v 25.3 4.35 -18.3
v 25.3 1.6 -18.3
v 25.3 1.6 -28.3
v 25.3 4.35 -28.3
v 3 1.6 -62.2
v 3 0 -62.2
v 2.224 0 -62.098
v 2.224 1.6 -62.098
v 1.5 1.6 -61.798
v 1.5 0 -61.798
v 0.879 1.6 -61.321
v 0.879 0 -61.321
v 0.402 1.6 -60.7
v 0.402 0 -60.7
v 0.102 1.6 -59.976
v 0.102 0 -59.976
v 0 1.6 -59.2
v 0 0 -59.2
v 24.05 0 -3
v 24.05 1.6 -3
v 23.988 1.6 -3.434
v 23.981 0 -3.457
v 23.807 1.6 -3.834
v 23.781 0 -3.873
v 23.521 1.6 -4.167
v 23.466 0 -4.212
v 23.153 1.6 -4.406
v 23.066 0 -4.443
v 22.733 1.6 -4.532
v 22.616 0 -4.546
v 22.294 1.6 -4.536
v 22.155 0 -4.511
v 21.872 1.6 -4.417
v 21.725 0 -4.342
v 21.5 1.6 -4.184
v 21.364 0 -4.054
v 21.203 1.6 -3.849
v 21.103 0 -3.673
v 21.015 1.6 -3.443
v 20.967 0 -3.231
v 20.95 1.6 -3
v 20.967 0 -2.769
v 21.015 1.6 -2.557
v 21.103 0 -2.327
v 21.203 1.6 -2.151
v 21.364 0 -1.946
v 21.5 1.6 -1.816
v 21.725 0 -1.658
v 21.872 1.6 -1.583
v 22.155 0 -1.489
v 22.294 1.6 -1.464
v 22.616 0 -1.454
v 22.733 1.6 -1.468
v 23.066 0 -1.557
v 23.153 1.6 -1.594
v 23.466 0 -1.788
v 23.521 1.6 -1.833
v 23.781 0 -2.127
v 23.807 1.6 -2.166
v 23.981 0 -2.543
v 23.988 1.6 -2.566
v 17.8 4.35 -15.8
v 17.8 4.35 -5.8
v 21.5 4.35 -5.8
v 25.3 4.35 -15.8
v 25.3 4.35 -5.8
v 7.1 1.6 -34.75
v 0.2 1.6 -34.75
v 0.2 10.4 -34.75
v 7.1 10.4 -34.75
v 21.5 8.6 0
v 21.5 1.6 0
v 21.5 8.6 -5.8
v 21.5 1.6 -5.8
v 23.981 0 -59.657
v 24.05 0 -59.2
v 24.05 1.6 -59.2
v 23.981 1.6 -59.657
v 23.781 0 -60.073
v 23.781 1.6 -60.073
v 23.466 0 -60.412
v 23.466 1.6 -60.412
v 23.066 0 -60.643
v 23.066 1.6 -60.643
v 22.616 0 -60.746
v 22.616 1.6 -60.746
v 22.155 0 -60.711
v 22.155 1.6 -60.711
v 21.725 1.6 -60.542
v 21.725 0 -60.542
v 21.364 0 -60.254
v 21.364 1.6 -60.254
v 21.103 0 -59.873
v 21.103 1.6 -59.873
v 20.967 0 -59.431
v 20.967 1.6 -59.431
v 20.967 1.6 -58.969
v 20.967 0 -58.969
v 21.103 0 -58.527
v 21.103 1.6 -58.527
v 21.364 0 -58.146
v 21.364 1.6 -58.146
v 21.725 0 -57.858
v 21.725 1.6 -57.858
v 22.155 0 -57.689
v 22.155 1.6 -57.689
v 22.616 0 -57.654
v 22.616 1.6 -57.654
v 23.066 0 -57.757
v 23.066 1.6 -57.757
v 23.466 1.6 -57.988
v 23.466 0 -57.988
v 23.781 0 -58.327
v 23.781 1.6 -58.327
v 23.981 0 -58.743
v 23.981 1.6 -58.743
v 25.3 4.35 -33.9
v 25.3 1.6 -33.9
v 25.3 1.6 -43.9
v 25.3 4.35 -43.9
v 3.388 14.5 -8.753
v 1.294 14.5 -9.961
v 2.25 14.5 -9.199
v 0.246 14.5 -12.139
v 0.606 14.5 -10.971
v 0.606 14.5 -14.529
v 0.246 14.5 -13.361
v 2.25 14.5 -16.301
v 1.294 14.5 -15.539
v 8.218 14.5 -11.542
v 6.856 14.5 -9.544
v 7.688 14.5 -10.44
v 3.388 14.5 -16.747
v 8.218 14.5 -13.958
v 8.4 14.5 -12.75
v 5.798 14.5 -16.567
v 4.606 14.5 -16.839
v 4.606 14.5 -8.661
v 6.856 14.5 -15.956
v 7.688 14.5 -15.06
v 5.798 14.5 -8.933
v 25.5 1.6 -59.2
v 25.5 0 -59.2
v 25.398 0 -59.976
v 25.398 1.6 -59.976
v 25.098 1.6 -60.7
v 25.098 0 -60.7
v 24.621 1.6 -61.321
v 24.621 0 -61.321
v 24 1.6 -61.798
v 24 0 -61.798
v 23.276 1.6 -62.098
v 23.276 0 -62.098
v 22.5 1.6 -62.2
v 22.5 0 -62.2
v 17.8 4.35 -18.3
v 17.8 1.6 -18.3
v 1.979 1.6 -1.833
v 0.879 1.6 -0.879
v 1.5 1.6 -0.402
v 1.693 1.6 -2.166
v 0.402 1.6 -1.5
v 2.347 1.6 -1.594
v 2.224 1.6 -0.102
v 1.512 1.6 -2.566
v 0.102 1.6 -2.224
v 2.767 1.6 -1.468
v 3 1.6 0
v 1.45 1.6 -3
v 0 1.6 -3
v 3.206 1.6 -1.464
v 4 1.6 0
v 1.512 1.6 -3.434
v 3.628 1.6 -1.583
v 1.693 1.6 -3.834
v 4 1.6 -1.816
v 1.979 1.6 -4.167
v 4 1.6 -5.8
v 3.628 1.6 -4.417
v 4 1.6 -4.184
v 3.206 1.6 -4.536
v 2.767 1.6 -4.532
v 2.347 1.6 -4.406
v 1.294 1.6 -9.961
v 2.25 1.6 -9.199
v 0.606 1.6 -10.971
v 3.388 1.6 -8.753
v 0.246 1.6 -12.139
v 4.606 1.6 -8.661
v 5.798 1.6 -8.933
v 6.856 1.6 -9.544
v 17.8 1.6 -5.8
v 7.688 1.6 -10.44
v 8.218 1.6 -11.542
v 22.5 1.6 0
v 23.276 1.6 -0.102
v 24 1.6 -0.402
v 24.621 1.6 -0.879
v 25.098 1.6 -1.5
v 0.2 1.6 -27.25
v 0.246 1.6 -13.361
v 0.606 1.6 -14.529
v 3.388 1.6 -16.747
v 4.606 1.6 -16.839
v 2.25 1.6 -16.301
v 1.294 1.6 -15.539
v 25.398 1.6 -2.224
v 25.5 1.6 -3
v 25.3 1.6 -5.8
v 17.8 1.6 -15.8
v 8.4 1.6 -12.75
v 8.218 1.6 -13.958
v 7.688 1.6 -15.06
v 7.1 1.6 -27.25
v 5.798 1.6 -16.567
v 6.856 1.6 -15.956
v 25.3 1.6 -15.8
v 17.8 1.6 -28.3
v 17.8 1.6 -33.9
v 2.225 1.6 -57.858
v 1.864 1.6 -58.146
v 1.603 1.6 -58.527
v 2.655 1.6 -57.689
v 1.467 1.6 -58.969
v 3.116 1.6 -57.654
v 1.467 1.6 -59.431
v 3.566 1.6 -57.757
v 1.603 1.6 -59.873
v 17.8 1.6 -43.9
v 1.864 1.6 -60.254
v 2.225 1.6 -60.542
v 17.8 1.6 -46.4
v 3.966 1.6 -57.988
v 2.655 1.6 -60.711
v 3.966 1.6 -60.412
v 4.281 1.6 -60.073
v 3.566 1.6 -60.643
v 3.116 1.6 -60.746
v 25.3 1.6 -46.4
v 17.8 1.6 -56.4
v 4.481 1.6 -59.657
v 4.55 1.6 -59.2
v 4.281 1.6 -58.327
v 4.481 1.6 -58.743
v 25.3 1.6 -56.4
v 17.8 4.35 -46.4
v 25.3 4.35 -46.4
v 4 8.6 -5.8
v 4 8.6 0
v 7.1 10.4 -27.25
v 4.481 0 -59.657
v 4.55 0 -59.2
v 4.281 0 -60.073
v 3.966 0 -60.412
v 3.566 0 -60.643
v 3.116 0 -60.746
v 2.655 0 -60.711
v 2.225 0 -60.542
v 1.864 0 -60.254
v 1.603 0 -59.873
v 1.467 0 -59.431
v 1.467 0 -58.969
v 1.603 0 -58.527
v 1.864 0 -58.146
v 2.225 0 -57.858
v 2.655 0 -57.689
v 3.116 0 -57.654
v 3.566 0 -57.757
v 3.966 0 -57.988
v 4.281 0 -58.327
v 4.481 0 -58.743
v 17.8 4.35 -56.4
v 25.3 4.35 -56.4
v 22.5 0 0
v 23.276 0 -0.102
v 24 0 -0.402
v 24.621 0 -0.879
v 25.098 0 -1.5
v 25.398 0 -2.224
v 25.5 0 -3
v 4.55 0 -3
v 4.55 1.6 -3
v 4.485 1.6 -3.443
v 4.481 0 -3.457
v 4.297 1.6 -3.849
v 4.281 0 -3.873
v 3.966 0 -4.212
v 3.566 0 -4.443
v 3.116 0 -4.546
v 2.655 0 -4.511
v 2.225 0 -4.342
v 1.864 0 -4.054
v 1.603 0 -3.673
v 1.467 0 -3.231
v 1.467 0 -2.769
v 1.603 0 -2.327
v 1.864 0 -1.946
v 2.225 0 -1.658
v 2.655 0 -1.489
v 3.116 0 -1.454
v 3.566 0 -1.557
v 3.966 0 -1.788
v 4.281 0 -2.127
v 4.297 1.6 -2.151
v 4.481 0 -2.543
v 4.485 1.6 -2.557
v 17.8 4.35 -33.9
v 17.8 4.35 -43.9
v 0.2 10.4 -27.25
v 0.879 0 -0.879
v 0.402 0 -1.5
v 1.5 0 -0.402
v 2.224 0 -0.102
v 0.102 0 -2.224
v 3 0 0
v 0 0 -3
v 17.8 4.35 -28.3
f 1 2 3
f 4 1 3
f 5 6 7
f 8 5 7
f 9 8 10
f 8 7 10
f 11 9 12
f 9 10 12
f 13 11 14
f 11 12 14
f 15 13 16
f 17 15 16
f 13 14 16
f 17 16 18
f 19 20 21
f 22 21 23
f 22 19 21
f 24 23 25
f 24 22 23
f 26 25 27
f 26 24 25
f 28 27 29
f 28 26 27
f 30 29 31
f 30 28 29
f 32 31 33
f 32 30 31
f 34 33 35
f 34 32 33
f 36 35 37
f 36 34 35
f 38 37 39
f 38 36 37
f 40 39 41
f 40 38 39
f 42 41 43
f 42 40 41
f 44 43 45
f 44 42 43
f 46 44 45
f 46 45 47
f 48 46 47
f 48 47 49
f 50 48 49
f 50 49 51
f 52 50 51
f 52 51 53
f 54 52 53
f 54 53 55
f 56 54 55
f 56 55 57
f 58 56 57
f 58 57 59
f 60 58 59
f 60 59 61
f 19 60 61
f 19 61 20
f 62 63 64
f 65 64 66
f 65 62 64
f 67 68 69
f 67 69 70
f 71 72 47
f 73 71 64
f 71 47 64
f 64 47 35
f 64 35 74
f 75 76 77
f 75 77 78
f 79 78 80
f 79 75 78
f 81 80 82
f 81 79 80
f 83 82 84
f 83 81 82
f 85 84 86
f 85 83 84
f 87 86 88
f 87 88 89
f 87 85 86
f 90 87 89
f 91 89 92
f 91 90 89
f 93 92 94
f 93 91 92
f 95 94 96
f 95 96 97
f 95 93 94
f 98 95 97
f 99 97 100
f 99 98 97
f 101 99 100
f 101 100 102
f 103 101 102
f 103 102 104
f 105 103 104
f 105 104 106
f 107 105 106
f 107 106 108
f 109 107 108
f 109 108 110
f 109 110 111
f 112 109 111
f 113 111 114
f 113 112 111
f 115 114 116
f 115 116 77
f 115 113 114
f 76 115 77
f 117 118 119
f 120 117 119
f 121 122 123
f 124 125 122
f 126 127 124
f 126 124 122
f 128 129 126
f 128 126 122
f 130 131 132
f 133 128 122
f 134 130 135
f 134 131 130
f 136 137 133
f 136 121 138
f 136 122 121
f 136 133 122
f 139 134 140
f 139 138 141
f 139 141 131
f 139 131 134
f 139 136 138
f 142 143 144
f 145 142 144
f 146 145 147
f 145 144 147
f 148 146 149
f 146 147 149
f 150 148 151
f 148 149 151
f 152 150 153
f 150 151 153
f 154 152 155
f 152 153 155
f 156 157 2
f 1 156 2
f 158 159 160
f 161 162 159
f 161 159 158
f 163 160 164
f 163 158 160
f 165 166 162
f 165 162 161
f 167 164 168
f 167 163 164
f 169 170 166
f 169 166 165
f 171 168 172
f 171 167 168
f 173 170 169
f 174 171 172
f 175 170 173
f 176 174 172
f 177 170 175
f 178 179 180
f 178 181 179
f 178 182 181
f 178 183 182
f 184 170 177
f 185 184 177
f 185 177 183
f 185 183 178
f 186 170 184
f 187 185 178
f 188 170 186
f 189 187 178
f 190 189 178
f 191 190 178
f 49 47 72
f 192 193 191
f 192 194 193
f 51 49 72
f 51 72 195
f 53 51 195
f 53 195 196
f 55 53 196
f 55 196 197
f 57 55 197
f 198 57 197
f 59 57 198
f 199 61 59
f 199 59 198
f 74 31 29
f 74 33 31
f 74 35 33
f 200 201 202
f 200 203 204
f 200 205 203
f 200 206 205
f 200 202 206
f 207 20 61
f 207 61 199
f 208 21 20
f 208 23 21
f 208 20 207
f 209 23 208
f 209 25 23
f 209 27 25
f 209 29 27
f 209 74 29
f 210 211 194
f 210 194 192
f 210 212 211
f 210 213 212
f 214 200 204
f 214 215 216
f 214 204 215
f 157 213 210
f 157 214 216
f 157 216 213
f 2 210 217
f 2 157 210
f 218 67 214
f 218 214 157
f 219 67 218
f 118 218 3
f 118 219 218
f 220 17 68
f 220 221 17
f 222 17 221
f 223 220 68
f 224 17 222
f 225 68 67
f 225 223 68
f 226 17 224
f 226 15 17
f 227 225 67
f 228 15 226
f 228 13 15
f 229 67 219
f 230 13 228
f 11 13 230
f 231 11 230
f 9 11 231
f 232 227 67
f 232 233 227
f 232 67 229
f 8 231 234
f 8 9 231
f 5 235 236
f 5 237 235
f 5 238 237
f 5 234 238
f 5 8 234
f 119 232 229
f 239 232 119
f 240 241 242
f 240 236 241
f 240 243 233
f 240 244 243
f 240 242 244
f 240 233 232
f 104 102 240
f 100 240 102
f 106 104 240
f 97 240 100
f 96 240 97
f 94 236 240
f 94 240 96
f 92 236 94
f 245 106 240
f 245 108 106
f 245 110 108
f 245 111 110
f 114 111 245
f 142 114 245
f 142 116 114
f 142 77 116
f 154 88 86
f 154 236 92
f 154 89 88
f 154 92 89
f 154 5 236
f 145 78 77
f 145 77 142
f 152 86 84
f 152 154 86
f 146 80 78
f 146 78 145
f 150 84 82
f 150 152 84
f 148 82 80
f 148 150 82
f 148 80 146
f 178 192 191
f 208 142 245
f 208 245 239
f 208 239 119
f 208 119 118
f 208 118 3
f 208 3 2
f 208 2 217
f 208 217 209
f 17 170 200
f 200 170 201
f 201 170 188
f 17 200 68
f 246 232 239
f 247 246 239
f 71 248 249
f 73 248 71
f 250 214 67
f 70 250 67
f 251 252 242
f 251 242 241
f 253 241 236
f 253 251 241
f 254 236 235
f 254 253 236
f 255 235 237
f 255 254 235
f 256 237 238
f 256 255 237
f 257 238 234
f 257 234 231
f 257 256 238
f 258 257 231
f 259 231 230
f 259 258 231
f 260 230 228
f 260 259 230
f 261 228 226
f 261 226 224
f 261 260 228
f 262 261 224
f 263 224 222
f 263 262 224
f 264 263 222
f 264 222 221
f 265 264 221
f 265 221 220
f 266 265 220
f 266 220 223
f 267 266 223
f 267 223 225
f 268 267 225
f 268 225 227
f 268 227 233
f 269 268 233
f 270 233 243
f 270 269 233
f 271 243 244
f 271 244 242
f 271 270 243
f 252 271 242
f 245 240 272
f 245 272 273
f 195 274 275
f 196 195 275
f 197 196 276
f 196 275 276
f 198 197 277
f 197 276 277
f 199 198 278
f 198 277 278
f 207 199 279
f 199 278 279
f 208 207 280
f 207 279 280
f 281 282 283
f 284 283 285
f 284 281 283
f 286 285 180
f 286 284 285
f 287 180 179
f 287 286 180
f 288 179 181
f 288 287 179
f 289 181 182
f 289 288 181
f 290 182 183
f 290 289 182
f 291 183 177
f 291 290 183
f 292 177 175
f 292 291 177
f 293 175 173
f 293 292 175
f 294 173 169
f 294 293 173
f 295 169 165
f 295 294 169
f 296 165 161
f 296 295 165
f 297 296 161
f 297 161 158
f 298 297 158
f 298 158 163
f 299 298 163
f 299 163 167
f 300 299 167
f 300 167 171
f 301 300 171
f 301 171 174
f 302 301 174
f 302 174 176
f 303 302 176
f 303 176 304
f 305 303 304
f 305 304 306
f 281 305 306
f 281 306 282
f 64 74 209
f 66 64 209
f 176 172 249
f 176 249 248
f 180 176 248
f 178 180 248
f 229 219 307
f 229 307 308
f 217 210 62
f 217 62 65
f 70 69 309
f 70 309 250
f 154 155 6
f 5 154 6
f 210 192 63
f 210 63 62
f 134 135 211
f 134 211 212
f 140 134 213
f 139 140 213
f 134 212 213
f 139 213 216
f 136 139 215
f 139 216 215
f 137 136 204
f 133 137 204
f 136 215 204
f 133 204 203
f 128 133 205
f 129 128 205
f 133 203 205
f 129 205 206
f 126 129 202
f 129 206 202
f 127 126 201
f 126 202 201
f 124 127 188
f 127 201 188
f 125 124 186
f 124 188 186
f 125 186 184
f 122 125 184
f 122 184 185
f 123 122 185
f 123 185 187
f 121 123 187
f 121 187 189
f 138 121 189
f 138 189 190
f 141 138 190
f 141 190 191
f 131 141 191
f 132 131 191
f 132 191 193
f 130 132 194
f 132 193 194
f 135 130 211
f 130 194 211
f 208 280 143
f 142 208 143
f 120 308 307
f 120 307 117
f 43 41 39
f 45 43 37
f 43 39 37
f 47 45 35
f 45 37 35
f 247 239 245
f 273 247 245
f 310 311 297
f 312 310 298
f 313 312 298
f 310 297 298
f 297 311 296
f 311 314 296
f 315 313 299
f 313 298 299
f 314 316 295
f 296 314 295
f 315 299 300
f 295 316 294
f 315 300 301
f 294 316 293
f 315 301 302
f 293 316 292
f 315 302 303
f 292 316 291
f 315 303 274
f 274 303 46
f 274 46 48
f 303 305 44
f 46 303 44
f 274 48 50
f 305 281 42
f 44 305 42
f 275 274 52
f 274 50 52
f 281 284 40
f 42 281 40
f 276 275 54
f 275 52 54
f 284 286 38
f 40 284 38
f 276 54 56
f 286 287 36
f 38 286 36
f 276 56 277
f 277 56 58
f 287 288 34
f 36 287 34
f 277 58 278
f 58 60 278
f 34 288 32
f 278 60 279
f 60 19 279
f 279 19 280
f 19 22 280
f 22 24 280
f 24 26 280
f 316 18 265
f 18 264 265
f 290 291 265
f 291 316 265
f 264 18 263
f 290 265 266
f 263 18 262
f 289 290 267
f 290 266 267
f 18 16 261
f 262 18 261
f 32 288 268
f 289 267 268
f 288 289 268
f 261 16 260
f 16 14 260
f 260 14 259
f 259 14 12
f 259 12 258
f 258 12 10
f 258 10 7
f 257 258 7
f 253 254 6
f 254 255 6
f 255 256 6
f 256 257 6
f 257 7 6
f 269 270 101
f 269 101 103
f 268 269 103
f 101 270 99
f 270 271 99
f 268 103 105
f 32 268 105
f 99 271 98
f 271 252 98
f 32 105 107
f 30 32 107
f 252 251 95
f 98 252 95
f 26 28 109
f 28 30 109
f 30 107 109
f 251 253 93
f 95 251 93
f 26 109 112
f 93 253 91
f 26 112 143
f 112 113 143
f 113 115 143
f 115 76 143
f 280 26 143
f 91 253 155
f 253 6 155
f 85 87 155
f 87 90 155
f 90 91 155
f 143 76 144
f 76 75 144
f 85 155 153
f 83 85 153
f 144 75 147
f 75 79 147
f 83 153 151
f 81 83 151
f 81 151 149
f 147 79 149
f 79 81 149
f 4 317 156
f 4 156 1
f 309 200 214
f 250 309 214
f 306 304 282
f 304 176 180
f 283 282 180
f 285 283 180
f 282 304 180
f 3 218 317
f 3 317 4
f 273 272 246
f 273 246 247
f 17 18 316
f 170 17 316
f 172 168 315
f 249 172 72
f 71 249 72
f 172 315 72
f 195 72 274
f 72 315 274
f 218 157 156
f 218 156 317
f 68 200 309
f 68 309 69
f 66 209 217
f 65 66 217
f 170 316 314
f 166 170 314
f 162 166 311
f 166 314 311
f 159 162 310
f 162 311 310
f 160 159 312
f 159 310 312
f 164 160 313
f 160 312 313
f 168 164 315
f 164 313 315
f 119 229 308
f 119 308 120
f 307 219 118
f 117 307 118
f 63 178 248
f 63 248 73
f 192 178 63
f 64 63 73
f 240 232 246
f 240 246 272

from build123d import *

# Parameters (mm, degrees)
SKETCH1_R           = 1.55
BOSS_EXTRUDE1_DEPTH = 1.6
SKETCH2_W           = 6.9
SKETCH2_H           = 7.5
BOSS_EXTRUDE2_DEPTH = 8.8
SKETCH3_R           = 4.1
BOSS_EXTRUDE3_DEPTH = 12.9
SKETCH4_W           = 7.5
SKETCH4_H           = 10
BOSS_EXTRUDE4_DEPTH = 2.75
SKETCH6_W           = 17.5
SKETCH6_H           = 5.8
BOSS_EXTRUDE5_DEPTH = 7


with BuildPart() as part:
    # Sketch1 → Boss-Extrude1 (new body)
    with BuildSketch(Plane(origin=(0, 0, 0), x_dir=(1, 0, 0), z_dir=(0, 1, 0))):
        with BuildLine():
            Line((3, 0), (22.5, 0))
            ThreePointArc((22.5, 0), (24.621320344, 0.878679656), (25.5, 3))
            Line((25.5, 3), (25.5, 59.2))
            ThreePointArc((25.5, 59.2), (24.621320344, 61.321320344), (22.5, 62.2))
            Line((22.5, 62.2), (3, 62.2))
            ThreePointArc((3, 62.2), (0.878679656, 61.321320344), (0, 59.2))
            Line((0, 59.2), (0, 3))
            ThreePointArc((0, 3), (0.878679656, 0.878679656), (3, 0))
        make_face()
        with Locations((3, 59.2)):
            Circle(SKETCH1_R, mode=Mode.SUBTRACT)
        with Locations((22.5, 59.2)):
            Circle(SKETCH1_R, mode=Mode.SUBTRACT)
        with Locations((22.5, 3)):
            Circle(SKETCH1_R, mode=Mode.SUBTRACT)
        with Locations((3, 3)):
            Circle(SKETCH1_R, mode=Mode.SUBTRACT)
    extrude(amount=BOSS_EXTRUDE1_DEPTH)

    # Sketch2 → Boss-Extrude2 (add)
    with BuildSketch(Plane(origin=(0, 1.6, 0), x_dir=(1, 0, 0), z_dir=(0, 1, 0))):
        with Locations((3.65, 31)):
            Rectangle(SKETCH2_W, SKETCH2_H)
    extrude(amount=BOSS_EXTRUDE2_DEPTH)

    # Sketch3 → Boss-Extrude3 (add)
    with BuildSketch(Plane(origin=(0, 1.6, 0), x_dir=(1, 0, 0), z_dir=(0, 1, 0))):
        with Locations((4.3, 12.75)):
            Circle(SKETCH3_R)
    extrude(amount=BOSS_EXTRUDE3_DEPTH)

    # Sketch4 → Boss-Extrude4 (add)
    with BuildSketch(Plane(origin=(0, 1.6, 0), x_dir=(1, 0, 0), z_dir=(0, 1, 0))):
        with Locations((21.55, 10.8)):
            Rectangle(SKETCH4_W, SKETCH4_H)
        with Locations((21.55, 23.3)):
            Rectangle(SKETCH4_W, SKETCH4_H)
        with Locations((21.55, 38.9)):
            Rectangle(SKETCH4_W, SKETCH4_H)
        with Locations((21.55, 51.4)):
            Rectangle(SKETCH4_W, SKETCH4_H)
    extrude(amount=BOSS_EXTRUDE4_DEPTH)

    # Sketch6 → Boss-Extrude5 (add)
    with BuildSketch(Plane(origin=(0, 1.6, 0), x_dir=(1, 0, 0), z_dir=(0, 1, 0))):
        with Locations((12.75, 2.9)):
            Rectangle(SKETCH6_W, SKETCH6_H)
    extrude(amount=BOSS_EXTRUDE5_DEPTH)


solid = part.part
